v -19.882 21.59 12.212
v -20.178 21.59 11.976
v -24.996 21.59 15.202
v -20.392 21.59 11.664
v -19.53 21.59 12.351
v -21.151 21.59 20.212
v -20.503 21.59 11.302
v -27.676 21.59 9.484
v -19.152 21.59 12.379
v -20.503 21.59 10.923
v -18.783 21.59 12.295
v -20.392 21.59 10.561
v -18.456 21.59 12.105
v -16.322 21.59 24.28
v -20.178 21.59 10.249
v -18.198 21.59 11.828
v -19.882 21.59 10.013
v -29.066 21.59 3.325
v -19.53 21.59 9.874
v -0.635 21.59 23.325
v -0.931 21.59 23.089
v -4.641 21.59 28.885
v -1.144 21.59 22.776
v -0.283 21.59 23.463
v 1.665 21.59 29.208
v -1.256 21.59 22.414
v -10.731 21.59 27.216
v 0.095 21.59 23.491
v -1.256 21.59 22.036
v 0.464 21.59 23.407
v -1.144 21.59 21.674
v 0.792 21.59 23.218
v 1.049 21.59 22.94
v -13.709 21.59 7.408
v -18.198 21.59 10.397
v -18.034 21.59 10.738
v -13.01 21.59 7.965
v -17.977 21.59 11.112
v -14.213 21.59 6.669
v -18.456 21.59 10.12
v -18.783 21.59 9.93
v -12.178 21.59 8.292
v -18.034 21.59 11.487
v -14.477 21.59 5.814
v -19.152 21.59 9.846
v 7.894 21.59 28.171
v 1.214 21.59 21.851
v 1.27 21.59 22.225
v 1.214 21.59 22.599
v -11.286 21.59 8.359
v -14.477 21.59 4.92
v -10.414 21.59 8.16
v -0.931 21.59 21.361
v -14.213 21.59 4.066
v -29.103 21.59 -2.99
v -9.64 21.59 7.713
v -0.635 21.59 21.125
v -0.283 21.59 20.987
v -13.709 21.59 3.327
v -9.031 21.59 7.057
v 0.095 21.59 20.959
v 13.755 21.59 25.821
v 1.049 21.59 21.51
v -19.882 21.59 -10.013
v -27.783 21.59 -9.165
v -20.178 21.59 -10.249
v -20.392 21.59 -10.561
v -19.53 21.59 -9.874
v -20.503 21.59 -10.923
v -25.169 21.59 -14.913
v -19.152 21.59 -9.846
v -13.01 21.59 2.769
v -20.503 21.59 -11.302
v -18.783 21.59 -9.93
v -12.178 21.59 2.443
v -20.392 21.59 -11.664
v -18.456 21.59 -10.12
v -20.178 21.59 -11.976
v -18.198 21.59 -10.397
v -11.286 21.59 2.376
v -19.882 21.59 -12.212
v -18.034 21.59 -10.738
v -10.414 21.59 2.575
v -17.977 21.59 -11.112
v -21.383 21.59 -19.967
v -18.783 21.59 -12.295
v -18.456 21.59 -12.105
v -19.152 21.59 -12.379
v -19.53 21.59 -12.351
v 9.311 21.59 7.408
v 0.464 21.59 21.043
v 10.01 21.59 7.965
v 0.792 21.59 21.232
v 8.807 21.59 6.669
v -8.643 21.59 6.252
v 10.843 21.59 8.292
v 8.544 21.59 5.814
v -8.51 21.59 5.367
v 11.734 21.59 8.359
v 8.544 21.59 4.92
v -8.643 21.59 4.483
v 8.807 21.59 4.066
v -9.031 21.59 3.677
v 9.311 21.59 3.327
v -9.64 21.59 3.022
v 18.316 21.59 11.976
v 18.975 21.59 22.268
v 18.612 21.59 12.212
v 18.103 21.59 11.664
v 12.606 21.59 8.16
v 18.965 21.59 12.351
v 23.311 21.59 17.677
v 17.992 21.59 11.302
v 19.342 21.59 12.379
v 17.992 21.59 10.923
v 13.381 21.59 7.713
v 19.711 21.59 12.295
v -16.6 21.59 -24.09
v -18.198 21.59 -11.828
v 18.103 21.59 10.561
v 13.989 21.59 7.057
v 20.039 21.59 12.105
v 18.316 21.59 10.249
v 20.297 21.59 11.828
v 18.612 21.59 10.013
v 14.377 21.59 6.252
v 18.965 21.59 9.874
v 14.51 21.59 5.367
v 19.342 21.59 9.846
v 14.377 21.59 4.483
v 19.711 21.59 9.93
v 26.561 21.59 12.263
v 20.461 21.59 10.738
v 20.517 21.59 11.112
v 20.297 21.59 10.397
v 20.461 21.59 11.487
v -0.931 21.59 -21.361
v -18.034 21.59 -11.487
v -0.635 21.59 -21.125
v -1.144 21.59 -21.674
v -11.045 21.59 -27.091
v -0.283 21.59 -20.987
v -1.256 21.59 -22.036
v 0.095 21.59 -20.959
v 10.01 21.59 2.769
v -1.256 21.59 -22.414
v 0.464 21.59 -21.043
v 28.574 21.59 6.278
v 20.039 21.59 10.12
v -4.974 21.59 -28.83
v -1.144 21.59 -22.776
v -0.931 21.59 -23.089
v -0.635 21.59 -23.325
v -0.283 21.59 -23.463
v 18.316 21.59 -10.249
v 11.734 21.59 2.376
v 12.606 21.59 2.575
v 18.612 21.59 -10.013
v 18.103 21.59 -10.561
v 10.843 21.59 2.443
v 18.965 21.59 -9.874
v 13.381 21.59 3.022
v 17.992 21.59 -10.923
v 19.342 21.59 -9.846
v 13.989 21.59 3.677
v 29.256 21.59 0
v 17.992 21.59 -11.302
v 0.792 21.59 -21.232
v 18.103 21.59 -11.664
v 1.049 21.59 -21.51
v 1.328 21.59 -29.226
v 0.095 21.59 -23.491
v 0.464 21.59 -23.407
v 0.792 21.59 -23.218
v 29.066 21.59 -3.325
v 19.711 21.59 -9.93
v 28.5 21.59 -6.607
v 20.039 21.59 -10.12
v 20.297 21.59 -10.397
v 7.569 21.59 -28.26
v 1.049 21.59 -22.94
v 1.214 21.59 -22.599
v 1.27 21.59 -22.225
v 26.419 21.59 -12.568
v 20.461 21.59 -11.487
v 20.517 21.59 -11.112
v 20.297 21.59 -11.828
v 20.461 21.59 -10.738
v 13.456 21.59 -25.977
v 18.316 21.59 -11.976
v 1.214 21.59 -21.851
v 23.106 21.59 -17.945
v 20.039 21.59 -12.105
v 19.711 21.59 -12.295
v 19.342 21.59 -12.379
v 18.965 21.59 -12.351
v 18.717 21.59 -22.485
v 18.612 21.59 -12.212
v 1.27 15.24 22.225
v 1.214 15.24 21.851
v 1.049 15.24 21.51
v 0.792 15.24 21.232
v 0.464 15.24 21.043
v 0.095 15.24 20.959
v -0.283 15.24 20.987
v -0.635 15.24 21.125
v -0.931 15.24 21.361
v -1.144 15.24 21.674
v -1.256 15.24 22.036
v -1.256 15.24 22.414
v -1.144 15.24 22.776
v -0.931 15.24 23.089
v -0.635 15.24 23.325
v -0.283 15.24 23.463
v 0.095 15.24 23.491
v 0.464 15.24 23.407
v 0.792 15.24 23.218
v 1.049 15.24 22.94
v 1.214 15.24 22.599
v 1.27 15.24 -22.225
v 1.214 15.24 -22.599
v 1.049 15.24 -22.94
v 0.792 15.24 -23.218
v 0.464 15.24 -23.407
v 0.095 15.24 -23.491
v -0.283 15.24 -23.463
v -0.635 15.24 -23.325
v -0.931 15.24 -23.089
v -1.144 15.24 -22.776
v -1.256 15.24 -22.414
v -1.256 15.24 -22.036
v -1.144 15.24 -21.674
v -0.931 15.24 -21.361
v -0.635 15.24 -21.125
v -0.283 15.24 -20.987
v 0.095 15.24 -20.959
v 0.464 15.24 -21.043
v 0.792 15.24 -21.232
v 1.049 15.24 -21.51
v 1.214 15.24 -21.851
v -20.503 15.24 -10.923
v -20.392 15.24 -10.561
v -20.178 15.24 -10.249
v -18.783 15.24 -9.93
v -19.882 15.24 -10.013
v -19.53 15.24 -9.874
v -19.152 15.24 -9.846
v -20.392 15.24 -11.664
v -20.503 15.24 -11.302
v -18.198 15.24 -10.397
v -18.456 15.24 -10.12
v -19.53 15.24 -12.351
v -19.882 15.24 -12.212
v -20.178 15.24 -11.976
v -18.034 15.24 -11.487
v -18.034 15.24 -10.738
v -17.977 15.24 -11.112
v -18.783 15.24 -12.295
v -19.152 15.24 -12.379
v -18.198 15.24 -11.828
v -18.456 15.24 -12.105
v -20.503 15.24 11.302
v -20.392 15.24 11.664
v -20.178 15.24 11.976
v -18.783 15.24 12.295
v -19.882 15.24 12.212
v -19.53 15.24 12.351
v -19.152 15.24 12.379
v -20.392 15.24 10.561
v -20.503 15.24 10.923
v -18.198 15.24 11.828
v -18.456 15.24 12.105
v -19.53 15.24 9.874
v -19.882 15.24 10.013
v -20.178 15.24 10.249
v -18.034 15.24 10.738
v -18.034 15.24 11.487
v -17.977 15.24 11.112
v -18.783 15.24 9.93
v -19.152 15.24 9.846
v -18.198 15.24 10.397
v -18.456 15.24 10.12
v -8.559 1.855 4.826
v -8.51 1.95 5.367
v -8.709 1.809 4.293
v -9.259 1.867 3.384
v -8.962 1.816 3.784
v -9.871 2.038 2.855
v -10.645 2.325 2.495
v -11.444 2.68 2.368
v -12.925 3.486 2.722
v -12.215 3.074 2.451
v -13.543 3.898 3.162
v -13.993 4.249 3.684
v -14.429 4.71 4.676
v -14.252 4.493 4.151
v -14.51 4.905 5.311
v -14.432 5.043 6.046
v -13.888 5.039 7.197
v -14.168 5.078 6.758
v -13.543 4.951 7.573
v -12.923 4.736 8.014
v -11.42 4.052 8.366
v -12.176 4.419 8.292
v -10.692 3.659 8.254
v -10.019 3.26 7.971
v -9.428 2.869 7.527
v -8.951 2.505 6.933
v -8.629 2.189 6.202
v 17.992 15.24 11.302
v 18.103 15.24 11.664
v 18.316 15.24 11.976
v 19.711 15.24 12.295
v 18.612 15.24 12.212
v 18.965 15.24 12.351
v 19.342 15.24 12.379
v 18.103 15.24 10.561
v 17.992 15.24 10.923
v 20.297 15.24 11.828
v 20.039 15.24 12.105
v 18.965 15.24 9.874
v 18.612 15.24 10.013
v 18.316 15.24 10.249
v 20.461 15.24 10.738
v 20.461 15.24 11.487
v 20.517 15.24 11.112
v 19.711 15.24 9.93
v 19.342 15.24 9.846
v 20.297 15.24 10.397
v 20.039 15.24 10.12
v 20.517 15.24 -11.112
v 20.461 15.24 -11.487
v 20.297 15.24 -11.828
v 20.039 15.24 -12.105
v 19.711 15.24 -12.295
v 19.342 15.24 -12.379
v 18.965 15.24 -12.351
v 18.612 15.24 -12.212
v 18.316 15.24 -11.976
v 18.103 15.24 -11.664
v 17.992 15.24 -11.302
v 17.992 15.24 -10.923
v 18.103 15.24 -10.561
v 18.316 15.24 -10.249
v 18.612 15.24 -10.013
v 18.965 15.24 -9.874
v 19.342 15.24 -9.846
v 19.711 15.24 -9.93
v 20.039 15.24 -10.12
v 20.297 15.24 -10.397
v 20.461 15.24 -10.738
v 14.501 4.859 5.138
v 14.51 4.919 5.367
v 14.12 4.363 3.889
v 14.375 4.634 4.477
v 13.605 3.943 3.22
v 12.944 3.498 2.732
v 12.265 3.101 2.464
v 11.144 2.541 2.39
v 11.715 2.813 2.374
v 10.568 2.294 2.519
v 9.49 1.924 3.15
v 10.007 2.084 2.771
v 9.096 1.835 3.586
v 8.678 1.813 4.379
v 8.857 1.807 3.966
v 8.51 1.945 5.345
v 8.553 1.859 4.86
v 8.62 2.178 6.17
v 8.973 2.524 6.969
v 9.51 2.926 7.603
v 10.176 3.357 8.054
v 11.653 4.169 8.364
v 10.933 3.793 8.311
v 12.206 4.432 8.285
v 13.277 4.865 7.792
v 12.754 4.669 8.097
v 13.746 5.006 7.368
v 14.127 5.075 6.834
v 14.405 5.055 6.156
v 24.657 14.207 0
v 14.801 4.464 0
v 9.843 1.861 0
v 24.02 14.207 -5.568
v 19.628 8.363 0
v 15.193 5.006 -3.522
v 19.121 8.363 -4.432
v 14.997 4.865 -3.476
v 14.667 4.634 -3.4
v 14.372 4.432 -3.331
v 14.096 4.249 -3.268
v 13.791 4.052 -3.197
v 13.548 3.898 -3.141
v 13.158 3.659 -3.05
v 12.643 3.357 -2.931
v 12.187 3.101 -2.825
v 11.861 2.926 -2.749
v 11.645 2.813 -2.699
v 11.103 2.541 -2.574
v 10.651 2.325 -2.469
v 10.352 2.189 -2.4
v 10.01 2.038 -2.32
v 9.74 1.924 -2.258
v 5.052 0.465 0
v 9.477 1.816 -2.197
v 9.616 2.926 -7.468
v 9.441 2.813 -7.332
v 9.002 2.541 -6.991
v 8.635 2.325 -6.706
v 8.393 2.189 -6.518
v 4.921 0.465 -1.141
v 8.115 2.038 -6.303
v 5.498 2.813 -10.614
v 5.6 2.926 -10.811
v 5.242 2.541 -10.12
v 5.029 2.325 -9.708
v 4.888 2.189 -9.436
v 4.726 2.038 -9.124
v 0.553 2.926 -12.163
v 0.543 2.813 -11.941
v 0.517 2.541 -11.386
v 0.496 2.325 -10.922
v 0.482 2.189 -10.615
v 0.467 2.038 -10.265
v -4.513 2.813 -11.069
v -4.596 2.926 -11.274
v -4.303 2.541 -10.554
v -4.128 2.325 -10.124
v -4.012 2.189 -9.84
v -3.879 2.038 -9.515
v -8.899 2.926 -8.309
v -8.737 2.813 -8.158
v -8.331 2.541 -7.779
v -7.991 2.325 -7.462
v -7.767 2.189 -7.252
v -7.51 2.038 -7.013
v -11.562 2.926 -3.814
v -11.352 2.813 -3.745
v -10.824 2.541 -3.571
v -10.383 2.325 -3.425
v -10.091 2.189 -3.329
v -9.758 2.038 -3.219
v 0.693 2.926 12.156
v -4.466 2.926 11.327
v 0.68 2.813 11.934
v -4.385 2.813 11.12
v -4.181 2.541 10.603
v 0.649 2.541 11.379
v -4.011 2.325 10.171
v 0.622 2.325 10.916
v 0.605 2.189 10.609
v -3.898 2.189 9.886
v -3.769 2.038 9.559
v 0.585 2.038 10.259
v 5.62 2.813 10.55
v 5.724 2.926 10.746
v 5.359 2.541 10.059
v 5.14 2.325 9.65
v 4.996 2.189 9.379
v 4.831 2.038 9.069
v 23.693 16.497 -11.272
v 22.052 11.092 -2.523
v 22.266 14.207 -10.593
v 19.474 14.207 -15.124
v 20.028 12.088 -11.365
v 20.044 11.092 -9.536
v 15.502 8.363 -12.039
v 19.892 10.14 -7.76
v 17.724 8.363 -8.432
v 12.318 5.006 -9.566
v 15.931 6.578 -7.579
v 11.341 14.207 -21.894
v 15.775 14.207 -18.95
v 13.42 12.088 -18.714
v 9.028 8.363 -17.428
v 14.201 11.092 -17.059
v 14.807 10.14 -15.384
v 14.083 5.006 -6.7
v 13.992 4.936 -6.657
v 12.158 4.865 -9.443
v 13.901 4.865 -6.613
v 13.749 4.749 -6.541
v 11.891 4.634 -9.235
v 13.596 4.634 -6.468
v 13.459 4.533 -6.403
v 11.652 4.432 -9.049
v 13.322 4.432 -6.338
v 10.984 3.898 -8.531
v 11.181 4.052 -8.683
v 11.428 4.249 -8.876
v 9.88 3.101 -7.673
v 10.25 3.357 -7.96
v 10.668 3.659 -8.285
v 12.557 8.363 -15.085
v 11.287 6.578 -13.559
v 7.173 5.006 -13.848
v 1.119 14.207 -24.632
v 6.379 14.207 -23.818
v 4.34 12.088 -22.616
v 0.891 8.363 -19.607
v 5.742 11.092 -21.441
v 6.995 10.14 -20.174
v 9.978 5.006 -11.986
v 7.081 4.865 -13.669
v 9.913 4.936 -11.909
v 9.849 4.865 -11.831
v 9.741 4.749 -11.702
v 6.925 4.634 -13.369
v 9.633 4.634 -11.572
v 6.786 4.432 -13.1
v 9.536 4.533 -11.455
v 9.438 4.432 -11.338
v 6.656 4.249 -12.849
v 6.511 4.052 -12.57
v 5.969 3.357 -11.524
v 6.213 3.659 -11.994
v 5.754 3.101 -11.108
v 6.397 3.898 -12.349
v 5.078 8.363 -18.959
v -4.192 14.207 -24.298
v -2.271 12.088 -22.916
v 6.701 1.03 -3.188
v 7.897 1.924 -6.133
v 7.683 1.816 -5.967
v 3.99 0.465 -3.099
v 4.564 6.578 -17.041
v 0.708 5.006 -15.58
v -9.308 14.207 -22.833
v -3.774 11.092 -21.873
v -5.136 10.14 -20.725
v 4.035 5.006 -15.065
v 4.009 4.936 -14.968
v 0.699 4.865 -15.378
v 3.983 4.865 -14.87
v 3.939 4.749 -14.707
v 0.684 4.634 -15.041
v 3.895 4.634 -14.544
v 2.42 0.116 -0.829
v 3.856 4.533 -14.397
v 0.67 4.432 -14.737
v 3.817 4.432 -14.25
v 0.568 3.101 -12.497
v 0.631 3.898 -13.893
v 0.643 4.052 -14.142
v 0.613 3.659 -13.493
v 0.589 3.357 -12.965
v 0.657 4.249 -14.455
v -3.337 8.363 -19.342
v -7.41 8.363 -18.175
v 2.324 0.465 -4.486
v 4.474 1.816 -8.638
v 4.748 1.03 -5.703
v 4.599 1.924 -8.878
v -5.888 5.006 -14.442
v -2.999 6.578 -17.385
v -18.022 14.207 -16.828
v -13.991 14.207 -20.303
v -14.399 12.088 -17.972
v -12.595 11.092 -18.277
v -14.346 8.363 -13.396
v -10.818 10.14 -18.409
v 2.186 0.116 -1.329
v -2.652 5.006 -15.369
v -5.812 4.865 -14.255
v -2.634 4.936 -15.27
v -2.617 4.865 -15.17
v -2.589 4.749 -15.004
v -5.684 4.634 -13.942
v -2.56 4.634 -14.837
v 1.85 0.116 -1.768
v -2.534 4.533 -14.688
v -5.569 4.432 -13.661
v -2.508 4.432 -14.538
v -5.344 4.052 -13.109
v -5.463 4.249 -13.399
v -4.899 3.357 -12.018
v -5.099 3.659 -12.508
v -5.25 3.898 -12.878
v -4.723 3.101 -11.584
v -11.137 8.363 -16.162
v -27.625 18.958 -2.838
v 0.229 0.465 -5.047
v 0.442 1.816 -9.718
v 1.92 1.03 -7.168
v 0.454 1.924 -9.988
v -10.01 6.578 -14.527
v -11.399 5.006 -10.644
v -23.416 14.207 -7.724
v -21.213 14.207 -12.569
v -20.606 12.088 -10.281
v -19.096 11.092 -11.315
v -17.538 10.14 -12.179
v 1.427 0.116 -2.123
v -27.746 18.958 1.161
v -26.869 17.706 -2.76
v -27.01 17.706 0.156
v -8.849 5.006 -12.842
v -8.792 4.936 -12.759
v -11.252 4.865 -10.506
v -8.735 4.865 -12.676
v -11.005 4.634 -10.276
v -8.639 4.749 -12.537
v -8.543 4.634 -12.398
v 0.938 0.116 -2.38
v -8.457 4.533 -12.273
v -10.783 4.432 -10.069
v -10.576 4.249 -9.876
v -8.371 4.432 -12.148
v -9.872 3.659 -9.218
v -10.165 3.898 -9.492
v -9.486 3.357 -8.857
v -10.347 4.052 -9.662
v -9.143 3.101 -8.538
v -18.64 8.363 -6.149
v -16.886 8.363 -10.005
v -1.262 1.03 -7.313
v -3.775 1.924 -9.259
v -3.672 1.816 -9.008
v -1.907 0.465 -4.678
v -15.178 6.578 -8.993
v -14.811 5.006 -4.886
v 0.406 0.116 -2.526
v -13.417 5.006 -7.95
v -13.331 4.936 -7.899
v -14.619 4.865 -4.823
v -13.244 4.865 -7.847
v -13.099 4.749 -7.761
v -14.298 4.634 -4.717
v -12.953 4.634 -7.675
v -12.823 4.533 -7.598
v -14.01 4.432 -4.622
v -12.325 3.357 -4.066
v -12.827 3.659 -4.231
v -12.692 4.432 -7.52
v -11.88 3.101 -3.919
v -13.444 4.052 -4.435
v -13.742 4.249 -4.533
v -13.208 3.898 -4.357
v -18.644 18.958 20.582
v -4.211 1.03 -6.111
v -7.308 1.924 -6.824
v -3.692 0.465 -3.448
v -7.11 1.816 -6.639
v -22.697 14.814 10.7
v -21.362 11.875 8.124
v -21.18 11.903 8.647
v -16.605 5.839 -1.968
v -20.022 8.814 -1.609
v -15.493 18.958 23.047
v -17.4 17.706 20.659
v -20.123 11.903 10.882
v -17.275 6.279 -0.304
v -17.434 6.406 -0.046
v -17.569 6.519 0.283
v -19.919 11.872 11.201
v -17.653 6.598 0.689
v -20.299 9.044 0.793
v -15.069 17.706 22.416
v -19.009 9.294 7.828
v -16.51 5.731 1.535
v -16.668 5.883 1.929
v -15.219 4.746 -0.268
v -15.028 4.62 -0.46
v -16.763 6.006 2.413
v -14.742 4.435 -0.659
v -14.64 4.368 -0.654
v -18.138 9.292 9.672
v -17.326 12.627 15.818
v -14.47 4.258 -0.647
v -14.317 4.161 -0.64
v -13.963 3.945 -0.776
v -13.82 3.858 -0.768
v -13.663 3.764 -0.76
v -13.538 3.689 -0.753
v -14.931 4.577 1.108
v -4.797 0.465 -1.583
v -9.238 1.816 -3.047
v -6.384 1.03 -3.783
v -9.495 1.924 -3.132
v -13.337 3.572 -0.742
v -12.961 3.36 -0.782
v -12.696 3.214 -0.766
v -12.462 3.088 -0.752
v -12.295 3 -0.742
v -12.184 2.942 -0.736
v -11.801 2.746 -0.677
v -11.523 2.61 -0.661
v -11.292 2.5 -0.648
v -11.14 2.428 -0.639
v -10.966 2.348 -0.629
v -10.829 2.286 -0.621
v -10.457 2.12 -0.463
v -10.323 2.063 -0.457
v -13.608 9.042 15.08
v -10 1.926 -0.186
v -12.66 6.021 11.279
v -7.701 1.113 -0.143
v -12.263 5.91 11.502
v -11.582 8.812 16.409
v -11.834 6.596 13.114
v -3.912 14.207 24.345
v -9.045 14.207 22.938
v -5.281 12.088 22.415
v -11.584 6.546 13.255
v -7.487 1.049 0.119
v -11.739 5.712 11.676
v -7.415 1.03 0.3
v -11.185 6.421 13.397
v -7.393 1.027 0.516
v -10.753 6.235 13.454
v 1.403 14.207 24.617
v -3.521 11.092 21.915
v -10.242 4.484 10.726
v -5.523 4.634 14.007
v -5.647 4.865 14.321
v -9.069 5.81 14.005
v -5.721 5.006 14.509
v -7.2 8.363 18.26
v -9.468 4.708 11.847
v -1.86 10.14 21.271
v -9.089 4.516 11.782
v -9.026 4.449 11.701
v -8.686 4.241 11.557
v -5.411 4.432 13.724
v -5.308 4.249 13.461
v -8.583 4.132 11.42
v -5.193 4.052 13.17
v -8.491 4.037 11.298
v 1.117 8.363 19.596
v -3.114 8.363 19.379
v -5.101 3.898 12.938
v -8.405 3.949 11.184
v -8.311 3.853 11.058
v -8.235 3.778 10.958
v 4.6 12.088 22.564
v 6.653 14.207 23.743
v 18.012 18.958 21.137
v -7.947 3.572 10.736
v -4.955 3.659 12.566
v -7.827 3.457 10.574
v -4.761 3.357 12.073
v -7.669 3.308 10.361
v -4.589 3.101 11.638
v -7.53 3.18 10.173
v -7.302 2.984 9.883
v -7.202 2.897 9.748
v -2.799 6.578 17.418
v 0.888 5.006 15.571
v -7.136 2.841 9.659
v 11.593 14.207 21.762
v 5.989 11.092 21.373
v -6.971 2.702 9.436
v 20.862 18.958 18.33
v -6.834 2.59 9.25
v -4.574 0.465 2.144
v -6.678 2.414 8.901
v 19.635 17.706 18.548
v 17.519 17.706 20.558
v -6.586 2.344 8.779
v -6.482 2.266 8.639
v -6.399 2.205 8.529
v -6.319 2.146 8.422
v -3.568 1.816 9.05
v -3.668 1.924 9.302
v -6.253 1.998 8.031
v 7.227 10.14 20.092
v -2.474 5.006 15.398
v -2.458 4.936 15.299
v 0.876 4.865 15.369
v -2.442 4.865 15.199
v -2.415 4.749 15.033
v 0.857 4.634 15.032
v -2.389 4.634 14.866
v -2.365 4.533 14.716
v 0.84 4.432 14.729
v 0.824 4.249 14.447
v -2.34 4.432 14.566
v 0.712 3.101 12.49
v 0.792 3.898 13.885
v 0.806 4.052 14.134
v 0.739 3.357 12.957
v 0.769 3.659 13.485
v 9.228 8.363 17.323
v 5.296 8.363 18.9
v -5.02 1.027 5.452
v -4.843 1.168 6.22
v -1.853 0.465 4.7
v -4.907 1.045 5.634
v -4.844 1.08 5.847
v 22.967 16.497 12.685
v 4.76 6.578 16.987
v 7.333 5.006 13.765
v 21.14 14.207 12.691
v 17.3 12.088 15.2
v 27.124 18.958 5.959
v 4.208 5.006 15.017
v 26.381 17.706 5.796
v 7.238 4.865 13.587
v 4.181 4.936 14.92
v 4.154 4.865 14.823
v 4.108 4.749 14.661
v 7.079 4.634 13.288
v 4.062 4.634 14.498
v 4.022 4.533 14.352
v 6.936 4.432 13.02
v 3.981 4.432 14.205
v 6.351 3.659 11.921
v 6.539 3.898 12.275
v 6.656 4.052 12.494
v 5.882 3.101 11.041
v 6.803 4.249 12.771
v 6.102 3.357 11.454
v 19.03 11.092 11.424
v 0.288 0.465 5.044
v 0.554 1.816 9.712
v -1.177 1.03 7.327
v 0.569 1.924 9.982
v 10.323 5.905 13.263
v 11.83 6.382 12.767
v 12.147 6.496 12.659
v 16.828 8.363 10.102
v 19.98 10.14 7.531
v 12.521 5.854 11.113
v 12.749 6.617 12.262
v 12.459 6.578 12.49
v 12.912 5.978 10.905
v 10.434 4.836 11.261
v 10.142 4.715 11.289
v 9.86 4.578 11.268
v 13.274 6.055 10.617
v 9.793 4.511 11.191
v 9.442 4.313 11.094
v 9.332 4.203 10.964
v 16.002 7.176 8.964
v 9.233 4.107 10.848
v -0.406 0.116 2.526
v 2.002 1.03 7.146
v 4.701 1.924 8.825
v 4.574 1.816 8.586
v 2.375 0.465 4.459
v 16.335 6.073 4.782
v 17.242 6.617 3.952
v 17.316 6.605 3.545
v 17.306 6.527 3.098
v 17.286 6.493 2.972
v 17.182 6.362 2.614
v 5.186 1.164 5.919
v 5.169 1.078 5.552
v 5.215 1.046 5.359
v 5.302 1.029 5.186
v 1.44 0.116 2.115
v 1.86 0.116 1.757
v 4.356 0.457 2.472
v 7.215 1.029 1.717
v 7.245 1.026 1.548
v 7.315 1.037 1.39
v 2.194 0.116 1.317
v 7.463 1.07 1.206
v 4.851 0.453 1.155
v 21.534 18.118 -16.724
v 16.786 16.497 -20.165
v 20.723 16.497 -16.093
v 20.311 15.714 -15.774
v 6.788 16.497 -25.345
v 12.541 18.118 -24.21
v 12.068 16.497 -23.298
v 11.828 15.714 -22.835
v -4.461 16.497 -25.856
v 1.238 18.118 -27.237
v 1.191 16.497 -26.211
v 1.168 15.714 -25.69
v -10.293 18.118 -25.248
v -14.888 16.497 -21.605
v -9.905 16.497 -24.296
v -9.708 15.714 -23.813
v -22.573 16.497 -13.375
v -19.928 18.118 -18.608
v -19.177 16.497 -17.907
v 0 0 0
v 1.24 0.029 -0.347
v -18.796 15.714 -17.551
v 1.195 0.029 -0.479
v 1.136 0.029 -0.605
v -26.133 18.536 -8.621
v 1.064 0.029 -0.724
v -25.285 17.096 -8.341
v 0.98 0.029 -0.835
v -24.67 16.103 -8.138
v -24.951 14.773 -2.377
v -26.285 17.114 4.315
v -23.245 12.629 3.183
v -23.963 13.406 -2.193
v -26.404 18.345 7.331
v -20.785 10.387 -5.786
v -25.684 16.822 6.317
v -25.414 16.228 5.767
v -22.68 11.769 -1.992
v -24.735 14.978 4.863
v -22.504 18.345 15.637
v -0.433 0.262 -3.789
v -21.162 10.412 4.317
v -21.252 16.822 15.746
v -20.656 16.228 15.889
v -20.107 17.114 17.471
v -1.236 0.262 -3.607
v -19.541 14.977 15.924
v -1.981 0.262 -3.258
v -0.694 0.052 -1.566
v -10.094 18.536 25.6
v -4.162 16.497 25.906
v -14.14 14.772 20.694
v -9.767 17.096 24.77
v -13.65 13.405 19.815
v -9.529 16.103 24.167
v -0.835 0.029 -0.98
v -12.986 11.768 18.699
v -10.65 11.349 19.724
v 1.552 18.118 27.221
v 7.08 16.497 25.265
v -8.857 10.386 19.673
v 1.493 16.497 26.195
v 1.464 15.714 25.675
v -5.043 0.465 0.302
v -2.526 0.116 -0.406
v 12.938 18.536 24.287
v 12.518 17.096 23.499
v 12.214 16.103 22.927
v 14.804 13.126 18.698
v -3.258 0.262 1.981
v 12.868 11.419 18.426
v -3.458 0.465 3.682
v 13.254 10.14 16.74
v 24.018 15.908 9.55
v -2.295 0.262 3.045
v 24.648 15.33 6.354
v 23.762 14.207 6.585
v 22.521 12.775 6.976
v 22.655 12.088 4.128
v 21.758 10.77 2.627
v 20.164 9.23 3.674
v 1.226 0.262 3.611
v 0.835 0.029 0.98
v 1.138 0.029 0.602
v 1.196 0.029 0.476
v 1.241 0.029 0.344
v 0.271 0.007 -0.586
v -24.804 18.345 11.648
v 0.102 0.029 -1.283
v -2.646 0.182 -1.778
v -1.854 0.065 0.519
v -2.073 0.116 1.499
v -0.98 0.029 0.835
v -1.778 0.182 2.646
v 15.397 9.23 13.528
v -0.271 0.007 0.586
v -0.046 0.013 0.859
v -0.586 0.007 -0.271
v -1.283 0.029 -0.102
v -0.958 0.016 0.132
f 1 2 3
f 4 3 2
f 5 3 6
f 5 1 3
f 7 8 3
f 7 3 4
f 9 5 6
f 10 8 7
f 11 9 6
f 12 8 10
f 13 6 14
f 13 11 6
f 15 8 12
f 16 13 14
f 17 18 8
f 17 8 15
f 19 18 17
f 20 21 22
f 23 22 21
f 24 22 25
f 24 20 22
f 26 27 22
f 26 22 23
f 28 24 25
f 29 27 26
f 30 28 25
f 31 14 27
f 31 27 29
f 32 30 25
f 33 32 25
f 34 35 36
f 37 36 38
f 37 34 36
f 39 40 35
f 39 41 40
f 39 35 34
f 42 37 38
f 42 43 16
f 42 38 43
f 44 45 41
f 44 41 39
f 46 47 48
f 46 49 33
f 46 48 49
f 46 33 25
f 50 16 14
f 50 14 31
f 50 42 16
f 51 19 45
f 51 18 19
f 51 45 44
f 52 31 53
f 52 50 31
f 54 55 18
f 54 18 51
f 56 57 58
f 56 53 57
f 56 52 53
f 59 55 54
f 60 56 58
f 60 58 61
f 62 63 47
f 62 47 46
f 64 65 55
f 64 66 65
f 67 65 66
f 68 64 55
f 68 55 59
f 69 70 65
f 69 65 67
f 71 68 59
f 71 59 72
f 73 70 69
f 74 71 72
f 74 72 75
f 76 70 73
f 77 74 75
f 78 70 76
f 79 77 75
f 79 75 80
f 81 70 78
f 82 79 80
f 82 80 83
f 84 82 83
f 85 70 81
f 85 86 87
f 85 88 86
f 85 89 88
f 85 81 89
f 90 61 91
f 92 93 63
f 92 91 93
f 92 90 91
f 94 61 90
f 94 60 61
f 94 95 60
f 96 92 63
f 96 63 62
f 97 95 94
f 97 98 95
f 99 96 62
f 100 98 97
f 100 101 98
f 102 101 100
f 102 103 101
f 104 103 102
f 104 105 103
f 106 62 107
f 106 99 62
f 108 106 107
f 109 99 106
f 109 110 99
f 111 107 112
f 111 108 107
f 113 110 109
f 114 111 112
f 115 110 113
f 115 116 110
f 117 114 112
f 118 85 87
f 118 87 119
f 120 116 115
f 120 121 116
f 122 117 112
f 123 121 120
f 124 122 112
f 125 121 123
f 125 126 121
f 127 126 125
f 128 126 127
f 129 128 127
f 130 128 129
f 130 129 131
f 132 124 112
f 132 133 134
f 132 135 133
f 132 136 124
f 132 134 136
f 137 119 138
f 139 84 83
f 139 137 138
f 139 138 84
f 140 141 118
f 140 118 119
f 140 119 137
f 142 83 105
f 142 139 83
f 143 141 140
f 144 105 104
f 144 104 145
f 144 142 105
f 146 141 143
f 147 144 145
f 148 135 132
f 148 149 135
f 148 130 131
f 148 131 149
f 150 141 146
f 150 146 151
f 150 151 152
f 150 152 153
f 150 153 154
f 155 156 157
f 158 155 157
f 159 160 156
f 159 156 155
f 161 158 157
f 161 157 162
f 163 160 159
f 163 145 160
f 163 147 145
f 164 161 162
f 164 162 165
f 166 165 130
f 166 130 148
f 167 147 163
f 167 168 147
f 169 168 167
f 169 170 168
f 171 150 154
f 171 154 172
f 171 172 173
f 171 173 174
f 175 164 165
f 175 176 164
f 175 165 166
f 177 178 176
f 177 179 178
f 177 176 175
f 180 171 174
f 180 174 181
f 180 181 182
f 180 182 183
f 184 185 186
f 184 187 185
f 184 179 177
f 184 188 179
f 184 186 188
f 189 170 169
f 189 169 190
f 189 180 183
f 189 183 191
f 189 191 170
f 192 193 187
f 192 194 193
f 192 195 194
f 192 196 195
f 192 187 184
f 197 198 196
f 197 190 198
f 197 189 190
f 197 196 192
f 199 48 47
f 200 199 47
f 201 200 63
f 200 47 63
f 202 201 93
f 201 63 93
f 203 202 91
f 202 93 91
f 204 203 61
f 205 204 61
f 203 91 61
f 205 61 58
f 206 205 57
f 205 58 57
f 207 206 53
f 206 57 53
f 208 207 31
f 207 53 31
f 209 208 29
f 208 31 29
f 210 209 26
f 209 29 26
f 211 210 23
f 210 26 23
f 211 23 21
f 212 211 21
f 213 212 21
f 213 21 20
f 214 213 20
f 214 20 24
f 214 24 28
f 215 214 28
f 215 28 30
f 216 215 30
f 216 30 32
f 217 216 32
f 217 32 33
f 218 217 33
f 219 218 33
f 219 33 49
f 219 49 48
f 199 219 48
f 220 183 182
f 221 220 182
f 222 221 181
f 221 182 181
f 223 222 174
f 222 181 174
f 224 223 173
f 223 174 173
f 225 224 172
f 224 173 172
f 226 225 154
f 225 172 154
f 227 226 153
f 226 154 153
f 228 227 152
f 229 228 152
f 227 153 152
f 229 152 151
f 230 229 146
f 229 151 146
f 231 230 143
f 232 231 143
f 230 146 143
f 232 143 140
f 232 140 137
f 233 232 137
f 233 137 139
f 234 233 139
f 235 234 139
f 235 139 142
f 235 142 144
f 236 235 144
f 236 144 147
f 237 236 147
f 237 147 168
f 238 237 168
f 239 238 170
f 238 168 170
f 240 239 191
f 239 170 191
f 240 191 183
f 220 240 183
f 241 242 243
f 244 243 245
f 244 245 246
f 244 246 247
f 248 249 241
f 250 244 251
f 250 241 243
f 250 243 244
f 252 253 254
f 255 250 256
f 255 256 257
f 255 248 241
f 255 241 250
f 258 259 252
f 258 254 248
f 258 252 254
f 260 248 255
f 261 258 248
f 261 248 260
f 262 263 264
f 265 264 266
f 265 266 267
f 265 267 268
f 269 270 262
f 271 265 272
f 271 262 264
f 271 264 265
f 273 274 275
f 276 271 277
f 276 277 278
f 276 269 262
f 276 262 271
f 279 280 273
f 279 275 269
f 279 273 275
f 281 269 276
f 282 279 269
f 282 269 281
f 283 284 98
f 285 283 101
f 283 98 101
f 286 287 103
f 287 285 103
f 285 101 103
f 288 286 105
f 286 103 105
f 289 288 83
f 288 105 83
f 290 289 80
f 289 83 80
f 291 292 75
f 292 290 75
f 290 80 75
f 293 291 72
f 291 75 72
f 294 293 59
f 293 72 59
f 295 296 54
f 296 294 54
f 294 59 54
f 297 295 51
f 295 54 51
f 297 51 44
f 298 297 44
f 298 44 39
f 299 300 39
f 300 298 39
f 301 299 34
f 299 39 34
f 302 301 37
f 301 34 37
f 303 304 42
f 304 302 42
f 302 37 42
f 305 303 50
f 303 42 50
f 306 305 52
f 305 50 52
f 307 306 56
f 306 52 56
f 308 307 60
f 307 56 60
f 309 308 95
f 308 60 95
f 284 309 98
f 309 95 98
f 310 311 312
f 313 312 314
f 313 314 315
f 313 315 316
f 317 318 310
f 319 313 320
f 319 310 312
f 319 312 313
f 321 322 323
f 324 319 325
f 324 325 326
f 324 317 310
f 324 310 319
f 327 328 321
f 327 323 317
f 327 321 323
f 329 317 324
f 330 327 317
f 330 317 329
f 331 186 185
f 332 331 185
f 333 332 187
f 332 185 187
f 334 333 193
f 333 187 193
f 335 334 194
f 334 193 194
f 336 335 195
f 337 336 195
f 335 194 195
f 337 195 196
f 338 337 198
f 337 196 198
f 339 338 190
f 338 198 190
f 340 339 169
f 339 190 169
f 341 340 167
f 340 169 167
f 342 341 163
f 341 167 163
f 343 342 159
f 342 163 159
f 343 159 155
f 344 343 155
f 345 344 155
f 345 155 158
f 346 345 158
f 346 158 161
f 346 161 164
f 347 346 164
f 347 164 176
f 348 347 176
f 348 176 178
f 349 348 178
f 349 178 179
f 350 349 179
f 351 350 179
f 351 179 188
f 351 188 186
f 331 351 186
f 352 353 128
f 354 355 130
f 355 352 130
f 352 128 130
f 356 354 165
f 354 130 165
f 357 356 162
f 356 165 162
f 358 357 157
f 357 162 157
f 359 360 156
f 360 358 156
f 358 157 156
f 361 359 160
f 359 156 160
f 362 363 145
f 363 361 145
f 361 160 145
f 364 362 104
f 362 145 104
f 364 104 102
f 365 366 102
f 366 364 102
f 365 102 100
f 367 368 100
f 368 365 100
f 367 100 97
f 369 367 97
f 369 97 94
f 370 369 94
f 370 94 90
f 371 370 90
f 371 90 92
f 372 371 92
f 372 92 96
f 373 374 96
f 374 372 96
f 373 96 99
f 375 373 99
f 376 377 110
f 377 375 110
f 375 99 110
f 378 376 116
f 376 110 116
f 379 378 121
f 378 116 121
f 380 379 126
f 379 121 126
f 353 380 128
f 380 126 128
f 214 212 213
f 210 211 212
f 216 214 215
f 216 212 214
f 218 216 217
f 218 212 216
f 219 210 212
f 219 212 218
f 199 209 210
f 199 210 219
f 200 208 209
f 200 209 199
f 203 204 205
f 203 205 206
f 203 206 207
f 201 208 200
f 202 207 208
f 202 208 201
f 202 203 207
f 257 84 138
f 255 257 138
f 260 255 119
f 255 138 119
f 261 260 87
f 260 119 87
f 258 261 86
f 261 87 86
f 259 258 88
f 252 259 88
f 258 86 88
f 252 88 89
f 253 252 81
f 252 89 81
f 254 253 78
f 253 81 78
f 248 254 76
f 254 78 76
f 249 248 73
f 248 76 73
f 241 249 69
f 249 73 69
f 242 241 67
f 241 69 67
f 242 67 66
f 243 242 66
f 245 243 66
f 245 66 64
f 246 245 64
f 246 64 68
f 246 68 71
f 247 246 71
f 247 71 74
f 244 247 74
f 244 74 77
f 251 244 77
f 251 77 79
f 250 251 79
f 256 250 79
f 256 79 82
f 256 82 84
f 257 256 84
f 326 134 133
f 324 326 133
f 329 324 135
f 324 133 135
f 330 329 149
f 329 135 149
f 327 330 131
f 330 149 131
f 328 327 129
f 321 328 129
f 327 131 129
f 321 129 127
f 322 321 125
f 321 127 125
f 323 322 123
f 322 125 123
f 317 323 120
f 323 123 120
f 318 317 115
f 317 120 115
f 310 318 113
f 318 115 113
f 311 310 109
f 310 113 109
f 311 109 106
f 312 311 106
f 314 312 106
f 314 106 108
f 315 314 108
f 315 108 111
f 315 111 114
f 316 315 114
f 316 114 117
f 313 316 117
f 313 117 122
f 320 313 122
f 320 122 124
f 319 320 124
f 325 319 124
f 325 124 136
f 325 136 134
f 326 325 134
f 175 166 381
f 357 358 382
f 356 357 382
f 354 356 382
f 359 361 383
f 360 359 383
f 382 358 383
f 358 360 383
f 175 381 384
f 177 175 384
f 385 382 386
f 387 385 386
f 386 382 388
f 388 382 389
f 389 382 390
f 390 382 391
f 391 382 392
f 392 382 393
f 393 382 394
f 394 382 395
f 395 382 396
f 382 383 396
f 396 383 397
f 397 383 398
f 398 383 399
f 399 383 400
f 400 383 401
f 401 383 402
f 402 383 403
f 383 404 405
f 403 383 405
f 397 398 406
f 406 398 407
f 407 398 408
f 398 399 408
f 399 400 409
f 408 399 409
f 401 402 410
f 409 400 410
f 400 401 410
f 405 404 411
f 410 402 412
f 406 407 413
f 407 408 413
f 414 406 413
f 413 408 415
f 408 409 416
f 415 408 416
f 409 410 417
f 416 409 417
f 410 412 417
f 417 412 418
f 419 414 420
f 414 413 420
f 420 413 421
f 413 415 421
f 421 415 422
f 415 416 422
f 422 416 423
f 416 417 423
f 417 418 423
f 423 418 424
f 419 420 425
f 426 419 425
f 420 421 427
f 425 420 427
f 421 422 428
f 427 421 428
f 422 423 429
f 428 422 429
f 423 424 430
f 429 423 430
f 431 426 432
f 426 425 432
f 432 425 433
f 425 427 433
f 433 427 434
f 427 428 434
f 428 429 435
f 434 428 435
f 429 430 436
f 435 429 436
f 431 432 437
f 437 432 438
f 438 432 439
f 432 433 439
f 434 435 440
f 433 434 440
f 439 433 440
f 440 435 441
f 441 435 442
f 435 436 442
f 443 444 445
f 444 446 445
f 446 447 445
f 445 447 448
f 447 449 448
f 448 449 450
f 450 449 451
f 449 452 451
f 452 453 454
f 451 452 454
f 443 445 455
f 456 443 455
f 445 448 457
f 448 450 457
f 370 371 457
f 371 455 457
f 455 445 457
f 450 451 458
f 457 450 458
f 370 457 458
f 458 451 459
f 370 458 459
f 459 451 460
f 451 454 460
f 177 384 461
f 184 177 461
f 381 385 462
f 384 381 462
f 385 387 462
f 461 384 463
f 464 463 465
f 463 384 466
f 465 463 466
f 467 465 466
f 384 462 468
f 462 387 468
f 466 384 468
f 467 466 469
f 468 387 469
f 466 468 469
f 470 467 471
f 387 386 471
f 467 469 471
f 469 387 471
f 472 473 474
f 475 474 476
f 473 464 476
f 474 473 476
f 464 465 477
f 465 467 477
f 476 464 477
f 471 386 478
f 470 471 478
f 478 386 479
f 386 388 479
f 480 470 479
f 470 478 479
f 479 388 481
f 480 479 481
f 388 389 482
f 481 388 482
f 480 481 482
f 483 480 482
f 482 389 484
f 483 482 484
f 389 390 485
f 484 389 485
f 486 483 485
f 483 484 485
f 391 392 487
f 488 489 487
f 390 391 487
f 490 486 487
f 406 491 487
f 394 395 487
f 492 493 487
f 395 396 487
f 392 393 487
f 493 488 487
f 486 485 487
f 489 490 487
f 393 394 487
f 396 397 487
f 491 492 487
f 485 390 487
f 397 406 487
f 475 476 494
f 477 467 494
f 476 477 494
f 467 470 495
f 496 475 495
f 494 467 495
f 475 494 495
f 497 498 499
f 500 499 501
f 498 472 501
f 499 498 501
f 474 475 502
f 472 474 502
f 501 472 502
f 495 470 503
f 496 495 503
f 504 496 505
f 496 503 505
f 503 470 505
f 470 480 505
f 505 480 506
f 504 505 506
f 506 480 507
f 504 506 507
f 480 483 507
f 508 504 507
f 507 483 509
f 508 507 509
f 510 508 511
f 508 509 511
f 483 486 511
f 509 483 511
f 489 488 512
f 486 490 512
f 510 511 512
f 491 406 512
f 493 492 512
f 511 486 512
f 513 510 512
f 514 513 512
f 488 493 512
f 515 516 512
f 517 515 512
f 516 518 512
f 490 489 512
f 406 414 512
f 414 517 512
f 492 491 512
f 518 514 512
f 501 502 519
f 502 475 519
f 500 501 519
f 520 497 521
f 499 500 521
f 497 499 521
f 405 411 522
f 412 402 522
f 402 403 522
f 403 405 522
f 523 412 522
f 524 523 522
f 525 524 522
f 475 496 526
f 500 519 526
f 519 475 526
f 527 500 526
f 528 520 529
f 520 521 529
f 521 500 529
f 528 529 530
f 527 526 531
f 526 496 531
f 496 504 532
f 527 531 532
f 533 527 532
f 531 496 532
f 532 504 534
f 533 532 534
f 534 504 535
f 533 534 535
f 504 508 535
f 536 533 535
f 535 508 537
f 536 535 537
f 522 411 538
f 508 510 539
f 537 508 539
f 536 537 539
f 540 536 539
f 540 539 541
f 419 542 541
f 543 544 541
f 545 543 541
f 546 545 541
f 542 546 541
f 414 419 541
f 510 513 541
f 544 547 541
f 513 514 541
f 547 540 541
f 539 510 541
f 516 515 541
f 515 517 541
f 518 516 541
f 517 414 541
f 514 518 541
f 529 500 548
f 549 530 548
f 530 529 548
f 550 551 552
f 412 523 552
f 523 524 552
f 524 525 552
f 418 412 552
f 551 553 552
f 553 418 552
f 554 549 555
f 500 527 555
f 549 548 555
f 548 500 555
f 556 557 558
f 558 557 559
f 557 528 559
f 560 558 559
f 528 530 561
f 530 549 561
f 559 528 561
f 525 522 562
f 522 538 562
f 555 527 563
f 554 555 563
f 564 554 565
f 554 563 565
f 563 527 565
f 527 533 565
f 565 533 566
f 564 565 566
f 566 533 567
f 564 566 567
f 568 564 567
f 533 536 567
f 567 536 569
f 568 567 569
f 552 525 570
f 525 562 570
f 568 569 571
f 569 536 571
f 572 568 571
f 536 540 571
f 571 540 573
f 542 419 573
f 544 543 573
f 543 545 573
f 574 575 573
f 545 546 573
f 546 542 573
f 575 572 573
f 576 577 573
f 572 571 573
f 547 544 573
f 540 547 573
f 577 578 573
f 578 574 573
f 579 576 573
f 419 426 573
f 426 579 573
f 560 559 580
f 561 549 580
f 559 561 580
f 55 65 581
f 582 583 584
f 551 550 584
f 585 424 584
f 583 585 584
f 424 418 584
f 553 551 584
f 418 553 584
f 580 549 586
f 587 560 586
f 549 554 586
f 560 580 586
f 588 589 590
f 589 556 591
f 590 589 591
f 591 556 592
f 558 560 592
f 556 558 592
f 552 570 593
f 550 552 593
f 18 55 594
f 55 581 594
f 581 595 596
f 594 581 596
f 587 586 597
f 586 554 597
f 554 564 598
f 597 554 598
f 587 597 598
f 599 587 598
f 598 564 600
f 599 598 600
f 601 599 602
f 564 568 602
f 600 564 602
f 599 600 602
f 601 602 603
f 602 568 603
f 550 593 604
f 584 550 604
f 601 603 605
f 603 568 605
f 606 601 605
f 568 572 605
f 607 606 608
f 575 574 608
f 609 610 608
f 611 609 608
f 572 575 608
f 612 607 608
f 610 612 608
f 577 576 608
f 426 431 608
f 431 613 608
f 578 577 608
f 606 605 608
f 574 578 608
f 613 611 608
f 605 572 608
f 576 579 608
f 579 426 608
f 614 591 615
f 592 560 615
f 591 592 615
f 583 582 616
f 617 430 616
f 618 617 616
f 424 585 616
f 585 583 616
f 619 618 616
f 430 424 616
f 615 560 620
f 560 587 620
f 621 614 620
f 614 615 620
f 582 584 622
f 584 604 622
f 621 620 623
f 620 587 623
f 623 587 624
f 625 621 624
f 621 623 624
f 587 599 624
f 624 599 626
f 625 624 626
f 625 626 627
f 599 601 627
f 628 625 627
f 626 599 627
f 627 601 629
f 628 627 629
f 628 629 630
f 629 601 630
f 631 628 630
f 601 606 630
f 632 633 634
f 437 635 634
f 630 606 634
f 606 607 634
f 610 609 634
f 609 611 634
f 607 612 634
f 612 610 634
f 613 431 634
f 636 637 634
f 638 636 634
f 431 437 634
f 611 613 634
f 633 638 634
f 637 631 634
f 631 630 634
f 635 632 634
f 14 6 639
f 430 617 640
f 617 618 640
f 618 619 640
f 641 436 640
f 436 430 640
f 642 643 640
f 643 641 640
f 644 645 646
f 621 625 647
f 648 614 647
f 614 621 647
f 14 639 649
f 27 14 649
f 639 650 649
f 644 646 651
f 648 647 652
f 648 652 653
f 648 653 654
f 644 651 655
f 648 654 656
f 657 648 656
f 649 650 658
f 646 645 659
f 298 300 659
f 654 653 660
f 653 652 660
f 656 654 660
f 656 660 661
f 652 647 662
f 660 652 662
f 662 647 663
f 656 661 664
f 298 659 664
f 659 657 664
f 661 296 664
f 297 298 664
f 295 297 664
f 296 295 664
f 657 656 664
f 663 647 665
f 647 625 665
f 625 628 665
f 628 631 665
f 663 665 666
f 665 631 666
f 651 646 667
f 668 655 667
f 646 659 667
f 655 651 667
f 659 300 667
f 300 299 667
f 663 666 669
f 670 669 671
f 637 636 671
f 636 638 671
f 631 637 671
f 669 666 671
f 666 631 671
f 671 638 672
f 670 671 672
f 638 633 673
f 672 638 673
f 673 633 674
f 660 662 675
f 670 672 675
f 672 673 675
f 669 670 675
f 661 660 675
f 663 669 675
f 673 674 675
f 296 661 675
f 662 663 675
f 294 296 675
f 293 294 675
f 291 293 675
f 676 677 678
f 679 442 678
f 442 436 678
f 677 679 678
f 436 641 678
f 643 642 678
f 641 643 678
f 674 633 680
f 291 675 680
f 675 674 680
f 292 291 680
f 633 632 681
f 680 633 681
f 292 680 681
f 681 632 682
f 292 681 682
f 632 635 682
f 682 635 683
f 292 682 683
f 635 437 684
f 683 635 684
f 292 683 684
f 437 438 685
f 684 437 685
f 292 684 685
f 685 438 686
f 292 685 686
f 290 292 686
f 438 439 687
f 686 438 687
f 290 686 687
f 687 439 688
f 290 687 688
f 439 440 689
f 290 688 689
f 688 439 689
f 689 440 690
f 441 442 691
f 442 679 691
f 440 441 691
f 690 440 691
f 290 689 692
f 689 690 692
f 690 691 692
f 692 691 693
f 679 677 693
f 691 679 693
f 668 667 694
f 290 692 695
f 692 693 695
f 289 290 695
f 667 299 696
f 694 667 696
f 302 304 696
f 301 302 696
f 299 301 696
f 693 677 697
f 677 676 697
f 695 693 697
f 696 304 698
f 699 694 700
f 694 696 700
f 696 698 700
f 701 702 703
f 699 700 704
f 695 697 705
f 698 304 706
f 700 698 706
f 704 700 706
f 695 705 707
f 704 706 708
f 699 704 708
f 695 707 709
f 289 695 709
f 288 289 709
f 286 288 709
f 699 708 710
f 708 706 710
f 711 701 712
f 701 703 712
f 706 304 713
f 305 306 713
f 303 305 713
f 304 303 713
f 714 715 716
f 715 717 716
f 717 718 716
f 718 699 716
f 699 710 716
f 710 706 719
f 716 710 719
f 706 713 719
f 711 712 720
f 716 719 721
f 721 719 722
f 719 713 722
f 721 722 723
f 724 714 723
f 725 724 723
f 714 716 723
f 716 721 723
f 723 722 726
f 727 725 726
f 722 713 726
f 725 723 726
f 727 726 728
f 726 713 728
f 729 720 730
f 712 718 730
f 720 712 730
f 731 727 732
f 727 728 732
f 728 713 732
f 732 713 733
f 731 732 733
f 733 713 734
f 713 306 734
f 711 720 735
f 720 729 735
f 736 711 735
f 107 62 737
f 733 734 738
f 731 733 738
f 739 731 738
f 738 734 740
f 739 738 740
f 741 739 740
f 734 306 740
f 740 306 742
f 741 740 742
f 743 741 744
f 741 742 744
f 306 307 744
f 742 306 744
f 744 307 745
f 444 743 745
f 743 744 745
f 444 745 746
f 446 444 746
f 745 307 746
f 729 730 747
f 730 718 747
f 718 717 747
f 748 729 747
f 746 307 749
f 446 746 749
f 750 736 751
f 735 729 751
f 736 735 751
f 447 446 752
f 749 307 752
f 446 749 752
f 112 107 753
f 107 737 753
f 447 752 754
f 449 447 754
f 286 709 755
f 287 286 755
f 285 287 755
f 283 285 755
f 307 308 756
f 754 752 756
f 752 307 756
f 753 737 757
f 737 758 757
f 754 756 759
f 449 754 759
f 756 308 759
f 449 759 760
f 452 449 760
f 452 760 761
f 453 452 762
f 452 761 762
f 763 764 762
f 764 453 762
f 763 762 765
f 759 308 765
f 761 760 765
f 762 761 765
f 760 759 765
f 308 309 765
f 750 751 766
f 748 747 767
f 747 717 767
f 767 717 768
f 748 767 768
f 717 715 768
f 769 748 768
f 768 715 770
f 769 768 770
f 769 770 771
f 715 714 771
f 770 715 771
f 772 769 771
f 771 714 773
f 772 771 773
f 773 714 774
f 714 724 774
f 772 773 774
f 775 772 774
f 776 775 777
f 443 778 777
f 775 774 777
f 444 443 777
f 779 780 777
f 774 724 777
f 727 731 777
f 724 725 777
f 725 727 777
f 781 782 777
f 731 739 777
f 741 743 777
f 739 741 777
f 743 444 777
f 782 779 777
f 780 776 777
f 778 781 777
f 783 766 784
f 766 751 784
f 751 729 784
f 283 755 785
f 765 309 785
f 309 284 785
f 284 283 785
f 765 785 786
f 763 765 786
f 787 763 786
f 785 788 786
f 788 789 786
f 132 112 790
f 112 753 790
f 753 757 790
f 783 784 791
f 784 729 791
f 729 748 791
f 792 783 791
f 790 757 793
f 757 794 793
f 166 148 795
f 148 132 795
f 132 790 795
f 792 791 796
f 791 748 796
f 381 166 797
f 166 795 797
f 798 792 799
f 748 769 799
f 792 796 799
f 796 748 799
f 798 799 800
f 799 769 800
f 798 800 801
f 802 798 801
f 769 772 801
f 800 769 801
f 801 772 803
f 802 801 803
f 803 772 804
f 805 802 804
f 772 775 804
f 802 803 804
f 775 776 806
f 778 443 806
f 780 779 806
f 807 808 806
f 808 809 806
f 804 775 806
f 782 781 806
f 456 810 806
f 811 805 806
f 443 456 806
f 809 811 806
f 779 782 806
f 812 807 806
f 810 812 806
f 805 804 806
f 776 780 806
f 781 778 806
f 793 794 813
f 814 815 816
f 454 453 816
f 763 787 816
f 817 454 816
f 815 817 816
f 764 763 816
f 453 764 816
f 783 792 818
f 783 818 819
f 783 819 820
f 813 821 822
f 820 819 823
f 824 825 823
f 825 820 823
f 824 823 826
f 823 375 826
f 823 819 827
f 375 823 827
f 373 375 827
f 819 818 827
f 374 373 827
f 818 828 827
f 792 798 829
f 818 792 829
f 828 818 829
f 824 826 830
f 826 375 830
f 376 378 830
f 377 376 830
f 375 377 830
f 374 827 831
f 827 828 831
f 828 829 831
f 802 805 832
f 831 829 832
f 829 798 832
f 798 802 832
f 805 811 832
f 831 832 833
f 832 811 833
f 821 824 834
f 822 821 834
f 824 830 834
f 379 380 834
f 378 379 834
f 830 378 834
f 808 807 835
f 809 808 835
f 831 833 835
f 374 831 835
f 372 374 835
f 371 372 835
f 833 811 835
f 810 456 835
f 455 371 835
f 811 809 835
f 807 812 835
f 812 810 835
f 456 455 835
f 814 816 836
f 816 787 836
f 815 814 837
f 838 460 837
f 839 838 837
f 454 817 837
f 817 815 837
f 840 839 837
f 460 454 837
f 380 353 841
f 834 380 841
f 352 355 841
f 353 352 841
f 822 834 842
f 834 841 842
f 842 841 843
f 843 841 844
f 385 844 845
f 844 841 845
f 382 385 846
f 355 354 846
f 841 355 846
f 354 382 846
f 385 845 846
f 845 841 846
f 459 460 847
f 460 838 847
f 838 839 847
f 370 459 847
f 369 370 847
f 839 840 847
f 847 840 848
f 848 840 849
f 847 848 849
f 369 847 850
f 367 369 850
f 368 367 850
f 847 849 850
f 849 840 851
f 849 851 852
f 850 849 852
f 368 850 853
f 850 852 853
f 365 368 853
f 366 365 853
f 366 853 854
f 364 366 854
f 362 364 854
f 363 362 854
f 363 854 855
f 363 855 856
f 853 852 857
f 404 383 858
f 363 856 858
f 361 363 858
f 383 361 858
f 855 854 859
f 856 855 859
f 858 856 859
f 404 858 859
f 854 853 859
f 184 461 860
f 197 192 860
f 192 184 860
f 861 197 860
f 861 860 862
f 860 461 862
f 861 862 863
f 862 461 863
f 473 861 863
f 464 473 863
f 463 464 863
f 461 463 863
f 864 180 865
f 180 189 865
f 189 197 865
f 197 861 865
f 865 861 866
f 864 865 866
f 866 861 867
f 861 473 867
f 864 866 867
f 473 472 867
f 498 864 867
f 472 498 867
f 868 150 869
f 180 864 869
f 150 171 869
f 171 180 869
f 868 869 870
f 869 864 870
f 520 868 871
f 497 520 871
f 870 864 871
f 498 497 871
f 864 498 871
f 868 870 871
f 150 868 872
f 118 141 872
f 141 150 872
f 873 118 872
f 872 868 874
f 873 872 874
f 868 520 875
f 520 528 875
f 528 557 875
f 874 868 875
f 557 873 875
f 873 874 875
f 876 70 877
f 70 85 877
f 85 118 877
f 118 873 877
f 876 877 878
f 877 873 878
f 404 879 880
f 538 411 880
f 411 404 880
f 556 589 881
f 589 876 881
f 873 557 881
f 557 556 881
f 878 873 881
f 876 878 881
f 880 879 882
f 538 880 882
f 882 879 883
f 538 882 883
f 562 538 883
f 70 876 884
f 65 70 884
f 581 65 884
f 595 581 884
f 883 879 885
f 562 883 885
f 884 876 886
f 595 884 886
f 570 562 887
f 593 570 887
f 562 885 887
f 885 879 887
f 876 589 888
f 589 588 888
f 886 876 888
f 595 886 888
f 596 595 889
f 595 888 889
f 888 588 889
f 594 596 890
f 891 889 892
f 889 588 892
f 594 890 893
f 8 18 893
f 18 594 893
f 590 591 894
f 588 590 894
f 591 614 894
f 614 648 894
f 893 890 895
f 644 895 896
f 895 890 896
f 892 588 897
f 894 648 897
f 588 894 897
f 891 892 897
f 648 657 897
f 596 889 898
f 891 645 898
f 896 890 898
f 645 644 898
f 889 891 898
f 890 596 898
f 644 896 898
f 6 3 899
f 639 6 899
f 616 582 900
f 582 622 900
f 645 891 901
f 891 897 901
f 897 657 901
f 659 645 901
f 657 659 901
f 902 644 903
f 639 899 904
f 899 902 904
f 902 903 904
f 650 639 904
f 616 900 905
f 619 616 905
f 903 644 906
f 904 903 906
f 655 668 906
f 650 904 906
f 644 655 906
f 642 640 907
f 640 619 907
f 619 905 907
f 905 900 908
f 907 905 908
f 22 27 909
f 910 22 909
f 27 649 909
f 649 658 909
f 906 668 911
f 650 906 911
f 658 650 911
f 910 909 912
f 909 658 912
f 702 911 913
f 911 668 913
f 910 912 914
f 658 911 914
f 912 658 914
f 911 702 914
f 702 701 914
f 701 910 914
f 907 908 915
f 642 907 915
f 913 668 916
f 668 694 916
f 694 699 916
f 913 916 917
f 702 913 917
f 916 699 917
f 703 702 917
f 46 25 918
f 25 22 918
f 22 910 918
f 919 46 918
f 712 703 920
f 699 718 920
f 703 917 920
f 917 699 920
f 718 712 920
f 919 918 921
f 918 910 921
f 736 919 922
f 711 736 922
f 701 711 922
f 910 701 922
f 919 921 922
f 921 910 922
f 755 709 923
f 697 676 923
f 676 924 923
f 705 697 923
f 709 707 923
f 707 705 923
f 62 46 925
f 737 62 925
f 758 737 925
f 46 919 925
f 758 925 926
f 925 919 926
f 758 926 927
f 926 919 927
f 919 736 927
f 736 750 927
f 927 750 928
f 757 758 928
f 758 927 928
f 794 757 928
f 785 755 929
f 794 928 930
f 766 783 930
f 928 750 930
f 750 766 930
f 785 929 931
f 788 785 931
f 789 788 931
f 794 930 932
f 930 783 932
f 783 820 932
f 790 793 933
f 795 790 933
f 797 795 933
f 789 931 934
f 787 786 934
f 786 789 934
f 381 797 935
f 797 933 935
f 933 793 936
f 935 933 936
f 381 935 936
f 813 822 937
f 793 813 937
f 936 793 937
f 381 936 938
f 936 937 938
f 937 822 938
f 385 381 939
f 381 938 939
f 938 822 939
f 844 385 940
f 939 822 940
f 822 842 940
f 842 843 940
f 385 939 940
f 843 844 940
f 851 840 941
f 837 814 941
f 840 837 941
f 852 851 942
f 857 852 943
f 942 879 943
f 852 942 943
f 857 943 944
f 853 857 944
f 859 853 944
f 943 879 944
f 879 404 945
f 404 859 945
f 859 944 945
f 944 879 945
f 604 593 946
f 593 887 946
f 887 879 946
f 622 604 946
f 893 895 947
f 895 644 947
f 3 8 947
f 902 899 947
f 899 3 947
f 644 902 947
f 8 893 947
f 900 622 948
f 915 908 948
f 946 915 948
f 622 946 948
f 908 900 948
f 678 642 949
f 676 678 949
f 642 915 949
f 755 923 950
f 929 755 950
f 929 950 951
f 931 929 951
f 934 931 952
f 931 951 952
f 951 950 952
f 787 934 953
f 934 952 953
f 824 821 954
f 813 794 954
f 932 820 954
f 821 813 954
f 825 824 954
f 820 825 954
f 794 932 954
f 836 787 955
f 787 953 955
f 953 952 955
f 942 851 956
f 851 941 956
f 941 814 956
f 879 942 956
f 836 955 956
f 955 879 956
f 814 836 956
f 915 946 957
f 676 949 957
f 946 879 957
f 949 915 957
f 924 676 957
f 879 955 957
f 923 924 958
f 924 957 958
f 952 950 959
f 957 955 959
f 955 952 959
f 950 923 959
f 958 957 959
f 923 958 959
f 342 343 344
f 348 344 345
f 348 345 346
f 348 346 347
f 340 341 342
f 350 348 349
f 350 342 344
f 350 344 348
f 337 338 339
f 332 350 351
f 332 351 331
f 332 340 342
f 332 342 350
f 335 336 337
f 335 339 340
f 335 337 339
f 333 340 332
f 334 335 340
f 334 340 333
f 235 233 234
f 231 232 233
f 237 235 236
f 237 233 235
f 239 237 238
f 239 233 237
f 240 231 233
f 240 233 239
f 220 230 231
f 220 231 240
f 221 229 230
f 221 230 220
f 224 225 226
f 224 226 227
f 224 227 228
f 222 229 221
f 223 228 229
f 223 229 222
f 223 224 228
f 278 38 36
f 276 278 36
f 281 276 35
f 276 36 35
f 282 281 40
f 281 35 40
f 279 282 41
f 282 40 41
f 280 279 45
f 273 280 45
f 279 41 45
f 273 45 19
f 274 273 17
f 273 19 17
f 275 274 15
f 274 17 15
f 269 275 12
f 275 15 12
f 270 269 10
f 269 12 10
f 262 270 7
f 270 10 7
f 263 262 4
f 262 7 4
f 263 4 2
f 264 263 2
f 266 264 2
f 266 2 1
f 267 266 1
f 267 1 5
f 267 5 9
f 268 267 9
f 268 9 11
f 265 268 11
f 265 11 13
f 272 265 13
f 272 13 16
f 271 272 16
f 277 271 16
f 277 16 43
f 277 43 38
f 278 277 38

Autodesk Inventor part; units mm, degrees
ref_plane "YZ Plane" through (0, 0, 0) normal (1, 0, 0) x (0, 1, 0)
ref_plane "XZ Plane" through (0, 0, 0) normal (0, 1, 0) x (-1, 0, 0)
sketch "Sketch6" plane through (0, 0, 0) normal (0, 0, 1) x (1, 0, 0)
  line L0 (540.6478, 1219.1491) -> (540.6478, -58.7076) construction
  line L1 (540.6478, -58.7076) -> (-407.4394, -58.7076) construction
  line L2 (-407.4394, -58.7076) -> (-407.4394, 1219.1491) construction
  line L3 (-407.4394, 1219.1491) -> (540.6478, 1219.1491) construction
  point P0 (0, 0)
sketch "Sketch5" plane through (0, 0, 0) normal (0, 0, 1) x (1, 0, 0)
  line L0 (0, 0) -> (0, 142.24)
  line L1 (0, 142.24) -> (50.8, 142.24)
  line L2 (50.8, 142.24) -> (-50.8, 142.24)
  line L3 (50.8, 142.24) -> (45.2986, 0) construction
  line L4 (45.2986, 0) -> (0, 0) construction
  spline S0 degree 2 poles (50.8, 142.24) (45.2986, 0) (0, 0) knots 1 1 1 2 2 2
  line L5 (-50.8, 142.24) -> (-45.2986, 0) construction
  line L6 (-45.2986, 0) -> (0, 0) construction
  spline S1 degree 2 poles (-50.8, 142.24) (-45.2986, 0) (0, 0) knots 1 1 1 2 2 2
  dimension "d20" = 142.24
  dimension "d21" = 50.8
  dimension "d22" = 101.6
revolve "Revolution1" add sketch "Sketch5" angle 360 about axis through (0, 0, 0) along (0, 1, 0) contours L0 L1 S0
ref_plane "Work Plane1" through (0, 21.59, 0) normal (0, 1, 0) x (1, 0, 0)
sketch "Sketch9" plane through (0, 21.59, 0) normal (0, 1, 0) x (1, 0, 0)
  line L0 (-101.4531, 67.0538) -> (104.6936, 67.0538)
  line L1 (104.6936, 67.0538) -> (104.6936, -70.5436)
  line L2 (104.6936, -70.5436) -> (-101.4531, -70.5436)
  line L3 (-101.4531, -70.5436) -> (-101.4531, 67.0538)
  point P0 (0, 0)
extrude "Extrusion2" cut sketch "Sketch9" along normal through all
sketch "Sketch10" plane through (0, 21.59, 0) normal (0, 1, 0) x (1, 0, 0)
  line L0 (0, 0) -> (0, 22.225)
  circle A0 centre (0, 22.225) radius 1.27
  circle A1 centre (-19.2474, 11.1125) radius 1.27
  circle A2 centre (-19.2474, -11.1125) radius 1.27
  circle A3 centre (0, -22.225) radius 1.27
  circle A4 centre (19.2474, -11.1125) radius 1.27
  circle A5 centre (19.2474, 11.1125) radius 1.27
  dimension "d75" = 22.225
  dimension "d76" = 2.54
  dimension "d79" = 360
extrude "Extrusion3" cut sketch "Sketch10" against normal blind 6.35
sketch "Sketch11" plane through (0, 21.59, 0) normal (0, 1, 0) x (1, 0, 0)
  line L0 (0, 0) -> (11.5101, -5.3673)
  line L1 (0, 0) -> (12.7, 0) construction
  line L2 (0, 0) -> (0, 4.6472)
  circle A0 centre (11.5101, -5.3673) radius 3
  circle A1 centre (-11.5101, -5.3673) radius 3
  dimension "d83" = 12.7
  dimension "d84" = 25
  dimension "d85" = 6
extrude "Extrusion4" cut sketch "Sketch11" against normal blind 25.4
properties part number "foreHullUpper" material "Polycarbonate, Clear"
